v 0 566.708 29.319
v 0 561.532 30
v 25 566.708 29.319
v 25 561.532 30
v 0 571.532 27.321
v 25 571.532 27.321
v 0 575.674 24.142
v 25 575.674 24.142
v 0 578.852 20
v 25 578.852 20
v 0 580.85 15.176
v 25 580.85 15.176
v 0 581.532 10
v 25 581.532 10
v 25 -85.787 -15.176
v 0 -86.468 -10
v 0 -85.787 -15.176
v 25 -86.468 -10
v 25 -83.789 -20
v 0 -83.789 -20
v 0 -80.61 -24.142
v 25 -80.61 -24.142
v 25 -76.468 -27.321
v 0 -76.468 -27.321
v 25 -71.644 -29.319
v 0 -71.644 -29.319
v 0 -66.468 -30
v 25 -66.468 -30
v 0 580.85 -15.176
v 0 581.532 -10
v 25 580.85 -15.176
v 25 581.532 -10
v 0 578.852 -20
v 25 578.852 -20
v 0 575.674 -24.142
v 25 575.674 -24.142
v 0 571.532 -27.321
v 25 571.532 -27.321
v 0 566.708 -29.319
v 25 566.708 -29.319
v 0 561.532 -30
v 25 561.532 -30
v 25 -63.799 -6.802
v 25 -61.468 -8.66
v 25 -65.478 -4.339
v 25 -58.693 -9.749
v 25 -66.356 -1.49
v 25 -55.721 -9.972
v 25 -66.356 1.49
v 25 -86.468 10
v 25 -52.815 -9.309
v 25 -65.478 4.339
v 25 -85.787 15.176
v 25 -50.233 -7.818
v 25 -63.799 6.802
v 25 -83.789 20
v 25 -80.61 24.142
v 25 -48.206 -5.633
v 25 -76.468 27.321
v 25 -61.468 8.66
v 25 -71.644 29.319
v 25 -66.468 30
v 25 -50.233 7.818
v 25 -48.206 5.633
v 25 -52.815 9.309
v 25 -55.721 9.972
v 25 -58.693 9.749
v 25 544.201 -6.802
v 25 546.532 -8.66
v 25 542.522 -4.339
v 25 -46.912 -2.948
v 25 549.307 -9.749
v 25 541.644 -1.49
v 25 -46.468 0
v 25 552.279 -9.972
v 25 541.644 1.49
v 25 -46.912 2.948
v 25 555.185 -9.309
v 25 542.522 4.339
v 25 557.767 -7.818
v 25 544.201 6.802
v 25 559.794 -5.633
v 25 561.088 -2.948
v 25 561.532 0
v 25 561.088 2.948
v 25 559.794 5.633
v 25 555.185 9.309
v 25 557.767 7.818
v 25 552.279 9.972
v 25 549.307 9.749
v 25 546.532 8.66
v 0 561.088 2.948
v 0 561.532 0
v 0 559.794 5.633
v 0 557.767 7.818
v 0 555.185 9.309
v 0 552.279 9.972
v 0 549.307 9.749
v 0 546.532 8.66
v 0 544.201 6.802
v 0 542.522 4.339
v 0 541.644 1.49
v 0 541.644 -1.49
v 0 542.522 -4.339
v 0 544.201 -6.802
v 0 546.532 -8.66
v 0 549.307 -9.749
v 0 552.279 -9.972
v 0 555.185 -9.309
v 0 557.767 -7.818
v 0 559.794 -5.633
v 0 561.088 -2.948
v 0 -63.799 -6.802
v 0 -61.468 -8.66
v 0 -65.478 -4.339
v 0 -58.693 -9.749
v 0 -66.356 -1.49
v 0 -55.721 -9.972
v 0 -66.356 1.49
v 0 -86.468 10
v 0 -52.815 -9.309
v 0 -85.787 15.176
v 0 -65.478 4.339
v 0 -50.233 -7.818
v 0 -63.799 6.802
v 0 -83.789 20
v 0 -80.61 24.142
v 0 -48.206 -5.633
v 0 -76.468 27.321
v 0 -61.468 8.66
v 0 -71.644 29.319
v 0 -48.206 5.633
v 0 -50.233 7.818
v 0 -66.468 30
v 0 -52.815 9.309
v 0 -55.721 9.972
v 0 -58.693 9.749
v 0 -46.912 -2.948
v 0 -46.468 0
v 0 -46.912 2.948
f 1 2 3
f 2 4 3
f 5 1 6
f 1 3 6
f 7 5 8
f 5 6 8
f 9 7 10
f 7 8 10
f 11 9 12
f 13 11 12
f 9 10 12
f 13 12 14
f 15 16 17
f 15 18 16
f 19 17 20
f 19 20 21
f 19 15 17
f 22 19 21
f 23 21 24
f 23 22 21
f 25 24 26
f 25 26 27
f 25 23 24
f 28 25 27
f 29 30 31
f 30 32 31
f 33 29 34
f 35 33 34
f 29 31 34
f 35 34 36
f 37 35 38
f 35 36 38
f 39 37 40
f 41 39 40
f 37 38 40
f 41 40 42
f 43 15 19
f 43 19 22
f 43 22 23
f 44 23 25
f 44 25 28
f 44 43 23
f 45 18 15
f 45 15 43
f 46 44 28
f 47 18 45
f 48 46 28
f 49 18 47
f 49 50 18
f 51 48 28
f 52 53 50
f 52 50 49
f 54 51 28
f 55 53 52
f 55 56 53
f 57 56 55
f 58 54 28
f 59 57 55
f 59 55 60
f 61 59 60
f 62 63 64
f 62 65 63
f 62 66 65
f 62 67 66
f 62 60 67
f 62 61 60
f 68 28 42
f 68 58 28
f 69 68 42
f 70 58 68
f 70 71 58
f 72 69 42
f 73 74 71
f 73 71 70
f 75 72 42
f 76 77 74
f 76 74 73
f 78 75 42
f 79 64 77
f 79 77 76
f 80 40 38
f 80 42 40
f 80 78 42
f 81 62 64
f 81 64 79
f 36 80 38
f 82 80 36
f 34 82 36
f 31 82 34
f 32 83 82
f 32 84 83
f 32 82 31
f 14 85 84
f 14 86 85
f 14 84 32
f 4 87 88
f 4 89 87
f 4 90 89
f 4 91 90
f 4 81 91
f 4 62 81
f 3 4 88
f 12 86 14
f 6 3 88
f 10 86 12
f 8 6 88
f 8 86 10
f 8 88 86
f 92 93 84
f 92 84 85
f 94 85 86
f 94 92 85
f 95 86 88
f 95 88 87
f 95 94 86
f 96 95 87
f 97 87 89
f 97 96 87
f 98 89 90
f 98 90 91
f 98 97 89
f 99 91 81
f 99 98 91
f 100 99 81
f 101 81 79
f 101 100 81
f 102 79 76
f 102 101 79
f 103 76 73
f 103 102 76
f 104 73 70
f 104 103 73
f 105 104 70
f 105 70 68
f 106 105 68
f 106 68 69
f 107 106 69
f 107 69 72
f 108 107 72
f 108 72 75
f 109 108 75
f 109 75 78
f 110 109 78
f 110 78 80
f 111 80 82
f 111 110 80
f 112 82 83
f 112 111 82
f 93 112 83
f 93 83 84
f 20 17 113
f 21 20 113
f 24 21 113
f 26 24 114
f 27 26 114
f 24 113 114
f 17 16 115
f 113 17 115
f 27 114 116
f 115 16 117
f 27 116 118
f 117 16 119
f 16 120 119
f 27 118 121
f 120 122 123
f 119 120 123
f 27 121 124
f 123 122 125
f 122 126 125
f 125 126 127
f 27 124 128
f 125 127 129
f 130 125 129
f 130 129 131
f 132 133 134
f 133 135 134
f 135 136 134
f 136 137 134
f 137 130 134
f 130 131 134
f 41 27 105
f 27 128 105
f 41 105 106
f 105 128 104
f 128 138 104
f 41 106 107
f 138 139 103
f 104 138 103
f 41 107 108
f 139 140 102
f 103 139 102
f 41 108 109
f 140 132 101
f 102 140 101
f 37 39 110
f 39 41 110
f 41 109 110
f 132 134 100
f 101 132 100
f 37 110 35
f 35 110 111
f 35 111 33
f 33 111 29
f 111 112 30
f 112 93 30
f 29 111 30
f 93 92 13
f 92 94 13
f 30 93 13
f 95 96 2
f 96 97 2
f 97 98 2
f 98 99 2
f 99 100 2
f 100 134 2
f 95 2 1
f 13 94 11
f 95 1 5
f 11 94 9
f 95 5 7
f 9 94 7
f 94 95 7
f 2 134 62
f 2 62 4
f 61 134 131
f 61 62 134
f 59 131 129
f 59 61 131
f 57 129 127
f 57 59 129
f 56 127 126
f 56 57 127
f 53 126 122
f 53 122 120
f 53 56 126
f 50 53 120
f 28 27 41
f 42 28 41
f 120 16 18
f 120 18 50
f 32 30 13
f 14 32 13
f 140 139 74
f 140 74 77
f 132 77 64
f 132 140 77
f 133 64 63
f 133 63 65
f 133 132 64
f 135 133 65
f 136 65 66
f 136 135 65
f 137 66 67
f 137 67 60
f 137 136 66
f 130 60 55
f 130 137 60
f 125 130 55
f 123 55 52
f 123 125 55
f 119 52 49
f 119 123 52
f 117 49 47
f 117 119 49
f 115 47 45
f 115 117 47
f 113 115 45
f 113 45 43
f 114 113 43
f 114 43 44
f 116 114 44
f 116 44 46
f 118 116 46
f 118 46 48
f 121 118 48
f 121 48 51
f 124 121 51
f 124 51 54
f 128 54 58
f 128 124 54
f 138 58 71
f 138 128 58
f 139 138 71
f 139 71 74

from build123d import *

# Parameters (mm, degrees)
F0_W     = 668
F0_H     = 60
F0_R     = 10
F1_DEPTH = 25
F2_R     = 20
F3_R     = 20
F4_R     = 20
F5_R     = 20


with BuildPart() as f1:
    # F0 (on Right) → F1 (new body)
    with BuildSketch(Plane.YZ):
        with Locations((247.531975, 0)):
            Rectangle(F0_W, F0_H)
        with Locations((-56.468025, 0)):
            Circle(F0_R, mode=Mode.SUBTRACT)
        with Locations((551.531975, 0)):
            Circle(F0_R, mode=Mode.SUBTRACT)
    extrude(amount=F1_DEPTH)

    # F2
    f2_edges = [f1.edges().sort_by_distance(p)[0] for p in [
        (12.5, 581.531975, 30),
    ]]
    fillet(f2_edges, radius=F2_R)

    # F3
    f3_edges = [f1.edges().sort_by_distance(p)[0] for p in [
        (12.5, 581.531975, -30),
    ]]
    fillet(f3_edges, radius=F3_R)

    # F4
    f4_edges = [f1.edges().sort_by_distance(p)[0] for p in [
        (12.5, -86.468025, 30),
    ]]
    fillet(f4_edges, radius=F4_R)

    # F5
    f5_edges = [f1.edges().sort_by_distance(p)[0] for p in [
        (12.5, -86.468025, -30),
    ]]
    fillet(f5_edges, radius=F5_R)


solid = f1.part
